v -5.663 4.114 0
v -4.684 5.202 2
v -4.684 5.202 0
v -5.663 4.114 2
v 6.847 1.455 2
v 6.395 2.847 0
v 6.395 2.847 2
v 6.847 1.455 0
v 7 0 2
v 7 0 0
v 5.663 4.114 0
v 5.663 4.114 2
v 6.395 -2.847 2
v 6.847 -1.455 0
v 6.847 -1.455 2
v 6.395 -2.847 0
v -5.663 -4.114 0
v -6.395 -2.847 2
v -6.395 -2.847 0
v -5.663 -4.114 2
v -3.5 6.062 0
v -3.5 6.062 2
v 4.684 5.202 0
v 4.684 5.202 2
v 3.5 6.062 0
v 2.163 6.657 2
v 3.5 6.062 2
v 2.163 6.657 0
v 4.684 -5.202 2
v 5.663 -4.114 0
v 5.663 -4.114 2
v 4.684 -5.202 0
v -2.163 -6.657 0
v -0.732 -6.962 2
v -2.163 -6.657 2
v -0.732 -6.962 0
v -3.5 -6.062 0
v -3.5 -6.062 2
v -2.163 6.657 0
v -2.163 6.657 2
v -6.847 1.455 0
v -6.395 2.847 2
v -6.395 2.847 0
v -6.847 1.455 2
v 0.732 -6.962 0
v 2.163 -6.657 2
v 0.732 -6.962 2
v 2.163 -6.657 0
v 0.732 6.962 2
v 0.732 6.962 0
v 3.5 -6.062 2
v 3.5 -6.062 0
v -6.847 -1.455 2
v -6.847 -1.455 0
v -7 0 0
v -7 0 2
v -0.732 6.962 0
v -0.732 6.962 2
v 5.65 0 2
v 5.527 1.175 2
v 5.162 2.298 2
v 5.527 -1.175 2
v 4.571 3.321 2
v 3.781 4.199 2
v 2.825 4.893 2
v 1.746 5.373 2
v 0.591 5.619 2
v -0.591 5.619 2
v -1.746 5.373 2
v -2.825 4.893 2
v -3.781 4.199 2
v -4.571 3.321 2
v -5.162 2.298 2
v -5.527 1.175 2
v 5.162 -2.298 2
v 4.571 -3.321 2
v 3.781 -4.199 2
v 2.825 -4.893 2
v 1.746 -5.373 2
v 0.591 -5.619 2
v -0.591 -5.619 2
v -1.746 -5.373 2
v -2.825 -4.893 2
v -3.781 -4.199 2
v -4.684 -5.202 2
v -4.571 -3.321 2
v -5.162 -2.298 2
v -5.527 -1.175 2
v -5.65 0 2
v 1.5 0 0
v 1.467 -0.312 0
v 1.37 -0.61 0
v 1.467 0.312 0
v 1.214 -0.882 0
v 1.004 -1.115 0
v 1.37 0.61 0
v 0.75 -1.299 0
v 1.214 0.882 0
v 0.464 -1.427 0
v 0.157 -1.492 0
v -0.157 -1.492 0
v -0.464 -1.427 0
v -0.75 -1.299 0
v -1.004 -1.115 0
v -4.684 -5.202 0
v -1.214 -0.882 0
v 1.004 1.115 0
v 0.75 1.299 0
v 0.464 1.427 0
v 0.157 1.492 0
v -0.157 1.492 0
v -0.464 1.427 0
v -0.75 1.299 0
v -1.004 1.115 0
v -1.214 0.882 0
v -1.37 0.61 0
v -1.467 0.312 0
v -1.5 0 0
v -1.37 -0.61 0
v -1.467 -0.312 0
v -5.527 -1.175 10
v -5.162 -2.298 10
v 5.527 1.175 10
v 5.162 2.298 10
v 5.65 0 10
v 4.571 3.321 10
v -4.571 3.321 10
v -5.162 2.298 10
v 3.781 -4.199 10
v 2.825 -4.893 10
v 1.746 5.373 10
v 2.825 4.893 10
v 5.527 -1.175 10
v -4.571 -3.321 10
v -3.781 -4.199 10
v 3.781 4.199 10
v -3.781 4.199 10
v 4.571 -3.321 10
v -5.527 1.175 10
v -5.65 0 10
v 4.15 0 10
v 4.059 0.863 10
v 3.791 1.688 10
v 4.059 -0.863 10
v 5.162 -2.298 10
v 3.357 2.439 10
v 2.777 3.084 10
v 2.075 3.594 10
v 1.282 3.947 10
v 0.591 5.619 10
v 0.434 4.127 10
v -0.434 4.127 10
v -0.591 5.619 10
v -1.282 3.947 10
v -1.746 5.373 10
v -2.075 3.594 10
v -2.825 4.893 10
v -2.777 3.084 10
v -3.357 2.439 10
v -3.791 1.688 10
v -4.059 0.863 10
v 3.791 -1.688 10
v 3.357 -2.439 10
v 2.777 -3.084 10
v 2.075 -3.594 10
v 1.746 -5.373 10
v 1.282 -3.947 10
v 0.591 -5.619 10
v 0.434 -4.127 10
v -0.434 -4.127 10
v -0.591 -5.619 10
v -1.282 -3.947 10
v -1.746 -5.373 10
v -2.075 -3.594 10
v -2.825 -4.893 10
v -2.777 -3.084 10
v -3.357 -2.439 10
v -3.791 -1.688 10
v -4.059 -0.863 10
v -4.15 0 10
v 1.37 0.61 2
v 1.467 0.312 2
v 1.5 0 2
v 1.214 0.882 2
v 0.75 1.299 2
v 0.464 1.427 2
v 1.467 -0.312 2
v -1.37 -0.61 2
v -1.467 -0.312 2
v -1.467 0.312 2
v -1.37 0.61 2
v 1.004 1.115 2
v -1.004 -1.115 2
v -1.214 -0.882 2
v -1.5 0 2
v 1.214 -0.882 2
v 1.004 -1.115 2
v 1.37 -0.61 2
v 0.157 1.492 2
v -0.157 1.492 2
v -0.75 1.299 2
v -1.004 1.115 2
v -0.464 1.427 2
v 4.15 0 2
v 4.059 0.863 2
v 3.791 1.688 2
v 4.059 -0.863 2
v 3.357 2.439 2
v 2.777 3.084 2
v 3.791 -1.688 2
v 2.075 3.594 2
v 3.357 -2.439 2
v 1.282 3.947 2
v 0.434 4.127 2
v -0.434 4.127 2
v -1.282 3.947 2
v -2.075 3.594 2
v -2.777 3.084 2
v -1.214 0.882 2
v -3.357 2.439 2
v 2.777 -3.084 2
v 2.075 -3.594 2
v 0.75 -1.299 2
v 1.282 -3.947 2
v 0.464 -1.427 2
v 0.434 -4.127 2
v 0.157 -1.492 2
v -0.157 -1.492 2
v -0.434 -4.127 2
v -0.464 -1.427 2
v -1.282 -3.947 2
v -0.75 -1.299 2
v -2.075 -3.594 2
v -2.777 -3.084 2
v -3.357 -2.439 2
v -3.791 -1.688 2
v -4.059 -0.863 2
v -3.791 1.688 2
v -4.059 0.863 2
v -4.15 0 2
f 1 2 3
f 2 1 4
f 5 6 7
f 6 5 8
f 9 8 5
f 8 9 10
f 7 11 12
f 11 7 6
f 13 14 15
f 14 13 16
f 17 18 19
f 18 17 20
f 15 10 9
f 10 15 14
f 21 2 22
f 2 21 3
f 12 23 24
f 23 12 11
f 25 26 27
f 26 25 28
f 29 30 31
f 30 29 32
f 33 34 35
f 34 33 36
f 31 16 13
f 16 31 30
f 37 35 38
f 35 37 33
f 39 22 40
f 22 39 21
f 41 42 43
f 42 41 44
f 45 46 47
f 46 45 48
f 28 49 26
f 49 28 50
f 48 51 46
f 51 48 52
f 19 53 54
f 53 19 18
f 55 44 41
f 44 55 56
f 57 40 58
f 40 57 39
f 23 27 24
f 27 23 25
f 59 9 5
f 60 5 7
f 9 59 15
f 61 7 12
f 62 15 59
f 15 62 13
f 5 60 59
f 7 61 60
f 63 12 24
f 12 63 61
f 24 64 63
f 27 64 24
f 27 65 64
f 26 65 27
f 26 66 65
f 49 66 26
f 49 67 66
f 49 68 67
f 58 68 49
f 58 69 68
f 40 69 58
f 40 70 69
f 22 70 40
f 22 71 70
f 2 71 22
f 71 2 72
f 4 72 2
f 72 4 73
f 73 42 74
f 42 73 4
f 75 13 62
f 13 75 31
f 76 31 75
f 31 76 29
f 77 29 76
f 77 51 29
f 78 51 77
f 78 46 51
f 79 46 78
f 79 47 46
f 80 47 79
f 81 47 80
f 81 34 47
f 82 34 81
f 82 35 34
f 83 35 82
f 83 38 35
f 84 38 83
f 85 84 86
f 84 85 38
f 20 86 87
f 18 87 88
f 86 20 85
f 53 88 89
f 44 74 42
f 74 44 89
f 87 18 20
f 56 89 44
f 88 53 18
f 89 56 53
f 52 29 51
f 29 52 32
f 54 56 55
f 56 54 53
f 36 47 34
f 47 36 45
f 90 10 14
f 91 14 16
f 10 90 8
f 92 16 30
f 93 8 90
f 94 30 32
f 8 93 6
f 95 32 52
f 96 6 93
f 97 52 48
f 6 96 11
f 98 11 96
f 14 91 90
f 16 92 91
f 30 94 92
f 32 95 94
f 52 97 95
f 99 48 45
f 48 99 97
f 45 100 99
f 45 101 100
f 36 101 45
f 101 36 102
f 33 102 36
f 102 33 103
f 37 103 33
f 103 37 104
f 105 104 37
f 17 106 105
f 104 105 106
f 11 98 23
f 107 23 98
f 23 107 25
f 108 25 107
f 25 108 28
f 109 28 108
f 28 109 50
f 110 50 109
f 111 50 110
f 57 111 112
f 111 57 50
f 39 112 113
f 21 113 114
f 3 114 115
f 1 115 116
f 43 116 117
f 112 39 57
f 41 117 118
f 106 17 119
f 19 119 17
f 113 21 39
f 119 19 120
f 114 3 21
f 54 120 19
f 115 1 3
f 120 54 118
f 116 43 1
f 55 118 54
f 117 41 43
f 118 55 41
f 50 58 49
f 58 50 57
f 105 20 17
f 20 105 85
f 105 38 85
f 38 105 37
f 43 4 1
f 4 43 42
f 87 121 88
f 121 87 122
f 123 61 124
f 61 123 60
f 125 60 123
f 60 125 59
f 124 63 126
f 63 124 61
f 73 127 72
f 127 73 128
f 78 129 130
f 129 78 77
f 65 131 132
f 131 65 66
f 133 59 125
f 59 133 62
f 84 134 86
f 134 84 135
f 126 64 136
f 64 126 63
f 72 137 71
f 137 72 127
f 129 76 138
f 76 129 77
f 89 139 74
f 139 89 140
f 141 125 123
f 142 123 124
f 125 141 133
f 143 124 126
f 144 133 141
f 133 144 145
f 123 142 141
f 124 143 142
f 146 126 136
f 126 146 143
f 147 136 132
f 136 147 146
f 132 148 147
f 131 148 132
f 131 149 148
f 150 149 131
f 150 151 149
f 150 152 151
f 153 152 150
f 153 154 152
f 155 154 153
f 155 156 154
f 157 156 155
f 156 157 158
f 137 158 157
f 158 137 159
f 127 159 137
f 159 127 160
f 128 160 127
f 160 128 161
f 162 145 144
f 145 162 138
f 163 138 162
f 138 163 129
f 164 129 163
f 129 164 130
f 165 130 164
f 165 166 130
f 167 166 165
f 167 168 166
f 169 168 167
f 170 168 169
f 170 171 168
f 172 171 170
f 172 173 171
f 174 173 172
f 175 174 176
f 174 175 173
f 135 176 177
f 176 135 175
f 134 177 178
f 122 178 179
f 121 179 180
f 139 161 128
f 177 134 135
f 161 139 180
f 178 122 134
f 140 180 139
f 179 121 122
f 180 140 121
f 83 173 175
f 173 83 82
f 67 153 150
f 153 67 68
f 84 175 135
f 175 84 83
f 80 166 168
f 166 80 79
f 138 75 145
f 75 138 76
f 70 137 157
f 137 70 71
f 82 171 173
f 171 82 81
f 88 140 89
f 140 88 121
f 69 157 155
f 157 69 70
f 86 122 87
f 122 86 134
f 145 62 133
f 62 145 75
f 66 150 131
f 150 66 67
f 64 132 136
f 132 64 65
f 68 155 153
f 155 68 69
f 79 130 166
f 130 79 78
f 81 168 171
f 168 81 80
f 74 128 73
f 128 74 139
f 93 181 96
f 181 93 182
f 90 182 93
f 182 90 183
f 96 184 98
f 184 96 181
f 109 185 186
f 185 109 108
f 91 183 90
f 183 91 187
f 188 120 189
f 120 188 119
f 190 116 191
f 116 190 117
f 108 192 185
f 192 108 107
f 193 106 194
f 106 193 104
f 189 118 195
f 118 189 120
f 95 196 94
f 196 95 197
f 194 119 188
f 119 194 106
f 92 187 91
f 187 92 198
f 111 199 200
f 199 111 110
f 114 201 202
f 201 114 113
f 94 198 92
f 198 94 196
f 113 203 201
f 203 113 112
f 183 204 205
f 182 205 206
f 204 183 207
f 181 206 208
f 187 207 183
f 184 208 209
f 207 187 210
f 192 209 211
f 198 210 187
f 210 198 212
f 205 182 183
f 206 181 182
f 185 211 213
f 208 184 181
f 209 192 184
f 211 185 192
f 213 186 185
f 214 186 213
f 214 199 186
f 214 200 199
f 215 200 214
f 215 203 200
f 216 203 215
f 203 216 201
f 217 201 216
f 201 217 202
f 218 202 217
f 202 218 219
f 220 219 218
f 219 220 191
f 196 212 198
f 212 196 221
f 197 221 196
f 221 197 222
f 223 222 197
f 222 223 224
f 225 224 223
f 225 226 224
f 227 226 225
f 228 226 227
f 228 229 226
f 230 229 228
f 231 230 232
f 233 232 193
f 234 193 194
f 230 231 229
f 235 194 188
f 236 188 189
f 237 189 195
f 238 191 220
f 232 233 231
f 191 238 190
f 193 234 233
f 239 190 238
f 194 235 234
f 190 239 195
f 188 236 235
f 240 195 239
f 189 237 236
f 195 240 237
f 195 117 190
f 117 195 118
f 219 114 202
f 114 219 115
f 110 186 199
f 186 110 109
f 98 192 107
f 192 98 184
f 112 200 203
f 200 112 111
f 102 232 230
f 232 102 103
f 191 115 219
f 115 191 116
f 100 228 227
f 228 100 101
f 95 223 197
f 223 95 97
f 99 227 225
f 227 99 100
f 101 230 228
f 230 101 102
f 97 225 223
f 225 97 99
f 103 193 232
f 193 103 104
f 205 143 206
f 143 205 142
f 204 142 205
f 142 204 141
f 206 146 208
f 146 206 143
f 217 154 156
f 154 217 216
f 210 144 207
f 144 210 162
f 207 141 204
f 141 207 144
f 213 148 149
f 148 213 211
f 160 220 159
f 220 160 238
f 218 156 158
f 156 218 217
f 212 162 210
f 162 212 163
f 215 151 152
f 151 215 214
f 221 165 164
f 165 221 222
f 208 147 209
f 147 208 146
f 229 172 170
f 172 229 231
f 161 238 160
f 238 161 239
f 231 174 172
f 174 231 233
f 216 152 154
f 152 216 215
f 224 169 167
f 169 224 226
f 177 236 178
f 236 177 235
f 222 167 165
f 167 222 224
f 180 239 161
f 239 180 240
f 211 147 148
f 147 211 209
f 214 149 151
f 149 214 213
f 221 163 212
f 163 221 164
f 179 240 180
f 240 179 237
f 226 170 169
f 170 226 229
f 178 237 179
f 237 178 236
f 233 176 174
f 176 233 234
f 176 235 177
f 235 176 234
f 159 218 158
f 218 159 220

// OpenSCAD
r1  = 7.0;
h1  = 2.0;

r2i = 4.15;
r2o = r2i + 1.5;
h2  = 8.0;

$fn=30;

difference() {
  union() {
    cylinder( h=h1, r=r1 );
    translate( [0,0,h1] ) cylinder( h=h2, r=r2o );
  }
  cylinder( h=h1, r=1.5 );
  translate( [0,0,h1] ) cylinder( h=h2, r=r2i );
}
